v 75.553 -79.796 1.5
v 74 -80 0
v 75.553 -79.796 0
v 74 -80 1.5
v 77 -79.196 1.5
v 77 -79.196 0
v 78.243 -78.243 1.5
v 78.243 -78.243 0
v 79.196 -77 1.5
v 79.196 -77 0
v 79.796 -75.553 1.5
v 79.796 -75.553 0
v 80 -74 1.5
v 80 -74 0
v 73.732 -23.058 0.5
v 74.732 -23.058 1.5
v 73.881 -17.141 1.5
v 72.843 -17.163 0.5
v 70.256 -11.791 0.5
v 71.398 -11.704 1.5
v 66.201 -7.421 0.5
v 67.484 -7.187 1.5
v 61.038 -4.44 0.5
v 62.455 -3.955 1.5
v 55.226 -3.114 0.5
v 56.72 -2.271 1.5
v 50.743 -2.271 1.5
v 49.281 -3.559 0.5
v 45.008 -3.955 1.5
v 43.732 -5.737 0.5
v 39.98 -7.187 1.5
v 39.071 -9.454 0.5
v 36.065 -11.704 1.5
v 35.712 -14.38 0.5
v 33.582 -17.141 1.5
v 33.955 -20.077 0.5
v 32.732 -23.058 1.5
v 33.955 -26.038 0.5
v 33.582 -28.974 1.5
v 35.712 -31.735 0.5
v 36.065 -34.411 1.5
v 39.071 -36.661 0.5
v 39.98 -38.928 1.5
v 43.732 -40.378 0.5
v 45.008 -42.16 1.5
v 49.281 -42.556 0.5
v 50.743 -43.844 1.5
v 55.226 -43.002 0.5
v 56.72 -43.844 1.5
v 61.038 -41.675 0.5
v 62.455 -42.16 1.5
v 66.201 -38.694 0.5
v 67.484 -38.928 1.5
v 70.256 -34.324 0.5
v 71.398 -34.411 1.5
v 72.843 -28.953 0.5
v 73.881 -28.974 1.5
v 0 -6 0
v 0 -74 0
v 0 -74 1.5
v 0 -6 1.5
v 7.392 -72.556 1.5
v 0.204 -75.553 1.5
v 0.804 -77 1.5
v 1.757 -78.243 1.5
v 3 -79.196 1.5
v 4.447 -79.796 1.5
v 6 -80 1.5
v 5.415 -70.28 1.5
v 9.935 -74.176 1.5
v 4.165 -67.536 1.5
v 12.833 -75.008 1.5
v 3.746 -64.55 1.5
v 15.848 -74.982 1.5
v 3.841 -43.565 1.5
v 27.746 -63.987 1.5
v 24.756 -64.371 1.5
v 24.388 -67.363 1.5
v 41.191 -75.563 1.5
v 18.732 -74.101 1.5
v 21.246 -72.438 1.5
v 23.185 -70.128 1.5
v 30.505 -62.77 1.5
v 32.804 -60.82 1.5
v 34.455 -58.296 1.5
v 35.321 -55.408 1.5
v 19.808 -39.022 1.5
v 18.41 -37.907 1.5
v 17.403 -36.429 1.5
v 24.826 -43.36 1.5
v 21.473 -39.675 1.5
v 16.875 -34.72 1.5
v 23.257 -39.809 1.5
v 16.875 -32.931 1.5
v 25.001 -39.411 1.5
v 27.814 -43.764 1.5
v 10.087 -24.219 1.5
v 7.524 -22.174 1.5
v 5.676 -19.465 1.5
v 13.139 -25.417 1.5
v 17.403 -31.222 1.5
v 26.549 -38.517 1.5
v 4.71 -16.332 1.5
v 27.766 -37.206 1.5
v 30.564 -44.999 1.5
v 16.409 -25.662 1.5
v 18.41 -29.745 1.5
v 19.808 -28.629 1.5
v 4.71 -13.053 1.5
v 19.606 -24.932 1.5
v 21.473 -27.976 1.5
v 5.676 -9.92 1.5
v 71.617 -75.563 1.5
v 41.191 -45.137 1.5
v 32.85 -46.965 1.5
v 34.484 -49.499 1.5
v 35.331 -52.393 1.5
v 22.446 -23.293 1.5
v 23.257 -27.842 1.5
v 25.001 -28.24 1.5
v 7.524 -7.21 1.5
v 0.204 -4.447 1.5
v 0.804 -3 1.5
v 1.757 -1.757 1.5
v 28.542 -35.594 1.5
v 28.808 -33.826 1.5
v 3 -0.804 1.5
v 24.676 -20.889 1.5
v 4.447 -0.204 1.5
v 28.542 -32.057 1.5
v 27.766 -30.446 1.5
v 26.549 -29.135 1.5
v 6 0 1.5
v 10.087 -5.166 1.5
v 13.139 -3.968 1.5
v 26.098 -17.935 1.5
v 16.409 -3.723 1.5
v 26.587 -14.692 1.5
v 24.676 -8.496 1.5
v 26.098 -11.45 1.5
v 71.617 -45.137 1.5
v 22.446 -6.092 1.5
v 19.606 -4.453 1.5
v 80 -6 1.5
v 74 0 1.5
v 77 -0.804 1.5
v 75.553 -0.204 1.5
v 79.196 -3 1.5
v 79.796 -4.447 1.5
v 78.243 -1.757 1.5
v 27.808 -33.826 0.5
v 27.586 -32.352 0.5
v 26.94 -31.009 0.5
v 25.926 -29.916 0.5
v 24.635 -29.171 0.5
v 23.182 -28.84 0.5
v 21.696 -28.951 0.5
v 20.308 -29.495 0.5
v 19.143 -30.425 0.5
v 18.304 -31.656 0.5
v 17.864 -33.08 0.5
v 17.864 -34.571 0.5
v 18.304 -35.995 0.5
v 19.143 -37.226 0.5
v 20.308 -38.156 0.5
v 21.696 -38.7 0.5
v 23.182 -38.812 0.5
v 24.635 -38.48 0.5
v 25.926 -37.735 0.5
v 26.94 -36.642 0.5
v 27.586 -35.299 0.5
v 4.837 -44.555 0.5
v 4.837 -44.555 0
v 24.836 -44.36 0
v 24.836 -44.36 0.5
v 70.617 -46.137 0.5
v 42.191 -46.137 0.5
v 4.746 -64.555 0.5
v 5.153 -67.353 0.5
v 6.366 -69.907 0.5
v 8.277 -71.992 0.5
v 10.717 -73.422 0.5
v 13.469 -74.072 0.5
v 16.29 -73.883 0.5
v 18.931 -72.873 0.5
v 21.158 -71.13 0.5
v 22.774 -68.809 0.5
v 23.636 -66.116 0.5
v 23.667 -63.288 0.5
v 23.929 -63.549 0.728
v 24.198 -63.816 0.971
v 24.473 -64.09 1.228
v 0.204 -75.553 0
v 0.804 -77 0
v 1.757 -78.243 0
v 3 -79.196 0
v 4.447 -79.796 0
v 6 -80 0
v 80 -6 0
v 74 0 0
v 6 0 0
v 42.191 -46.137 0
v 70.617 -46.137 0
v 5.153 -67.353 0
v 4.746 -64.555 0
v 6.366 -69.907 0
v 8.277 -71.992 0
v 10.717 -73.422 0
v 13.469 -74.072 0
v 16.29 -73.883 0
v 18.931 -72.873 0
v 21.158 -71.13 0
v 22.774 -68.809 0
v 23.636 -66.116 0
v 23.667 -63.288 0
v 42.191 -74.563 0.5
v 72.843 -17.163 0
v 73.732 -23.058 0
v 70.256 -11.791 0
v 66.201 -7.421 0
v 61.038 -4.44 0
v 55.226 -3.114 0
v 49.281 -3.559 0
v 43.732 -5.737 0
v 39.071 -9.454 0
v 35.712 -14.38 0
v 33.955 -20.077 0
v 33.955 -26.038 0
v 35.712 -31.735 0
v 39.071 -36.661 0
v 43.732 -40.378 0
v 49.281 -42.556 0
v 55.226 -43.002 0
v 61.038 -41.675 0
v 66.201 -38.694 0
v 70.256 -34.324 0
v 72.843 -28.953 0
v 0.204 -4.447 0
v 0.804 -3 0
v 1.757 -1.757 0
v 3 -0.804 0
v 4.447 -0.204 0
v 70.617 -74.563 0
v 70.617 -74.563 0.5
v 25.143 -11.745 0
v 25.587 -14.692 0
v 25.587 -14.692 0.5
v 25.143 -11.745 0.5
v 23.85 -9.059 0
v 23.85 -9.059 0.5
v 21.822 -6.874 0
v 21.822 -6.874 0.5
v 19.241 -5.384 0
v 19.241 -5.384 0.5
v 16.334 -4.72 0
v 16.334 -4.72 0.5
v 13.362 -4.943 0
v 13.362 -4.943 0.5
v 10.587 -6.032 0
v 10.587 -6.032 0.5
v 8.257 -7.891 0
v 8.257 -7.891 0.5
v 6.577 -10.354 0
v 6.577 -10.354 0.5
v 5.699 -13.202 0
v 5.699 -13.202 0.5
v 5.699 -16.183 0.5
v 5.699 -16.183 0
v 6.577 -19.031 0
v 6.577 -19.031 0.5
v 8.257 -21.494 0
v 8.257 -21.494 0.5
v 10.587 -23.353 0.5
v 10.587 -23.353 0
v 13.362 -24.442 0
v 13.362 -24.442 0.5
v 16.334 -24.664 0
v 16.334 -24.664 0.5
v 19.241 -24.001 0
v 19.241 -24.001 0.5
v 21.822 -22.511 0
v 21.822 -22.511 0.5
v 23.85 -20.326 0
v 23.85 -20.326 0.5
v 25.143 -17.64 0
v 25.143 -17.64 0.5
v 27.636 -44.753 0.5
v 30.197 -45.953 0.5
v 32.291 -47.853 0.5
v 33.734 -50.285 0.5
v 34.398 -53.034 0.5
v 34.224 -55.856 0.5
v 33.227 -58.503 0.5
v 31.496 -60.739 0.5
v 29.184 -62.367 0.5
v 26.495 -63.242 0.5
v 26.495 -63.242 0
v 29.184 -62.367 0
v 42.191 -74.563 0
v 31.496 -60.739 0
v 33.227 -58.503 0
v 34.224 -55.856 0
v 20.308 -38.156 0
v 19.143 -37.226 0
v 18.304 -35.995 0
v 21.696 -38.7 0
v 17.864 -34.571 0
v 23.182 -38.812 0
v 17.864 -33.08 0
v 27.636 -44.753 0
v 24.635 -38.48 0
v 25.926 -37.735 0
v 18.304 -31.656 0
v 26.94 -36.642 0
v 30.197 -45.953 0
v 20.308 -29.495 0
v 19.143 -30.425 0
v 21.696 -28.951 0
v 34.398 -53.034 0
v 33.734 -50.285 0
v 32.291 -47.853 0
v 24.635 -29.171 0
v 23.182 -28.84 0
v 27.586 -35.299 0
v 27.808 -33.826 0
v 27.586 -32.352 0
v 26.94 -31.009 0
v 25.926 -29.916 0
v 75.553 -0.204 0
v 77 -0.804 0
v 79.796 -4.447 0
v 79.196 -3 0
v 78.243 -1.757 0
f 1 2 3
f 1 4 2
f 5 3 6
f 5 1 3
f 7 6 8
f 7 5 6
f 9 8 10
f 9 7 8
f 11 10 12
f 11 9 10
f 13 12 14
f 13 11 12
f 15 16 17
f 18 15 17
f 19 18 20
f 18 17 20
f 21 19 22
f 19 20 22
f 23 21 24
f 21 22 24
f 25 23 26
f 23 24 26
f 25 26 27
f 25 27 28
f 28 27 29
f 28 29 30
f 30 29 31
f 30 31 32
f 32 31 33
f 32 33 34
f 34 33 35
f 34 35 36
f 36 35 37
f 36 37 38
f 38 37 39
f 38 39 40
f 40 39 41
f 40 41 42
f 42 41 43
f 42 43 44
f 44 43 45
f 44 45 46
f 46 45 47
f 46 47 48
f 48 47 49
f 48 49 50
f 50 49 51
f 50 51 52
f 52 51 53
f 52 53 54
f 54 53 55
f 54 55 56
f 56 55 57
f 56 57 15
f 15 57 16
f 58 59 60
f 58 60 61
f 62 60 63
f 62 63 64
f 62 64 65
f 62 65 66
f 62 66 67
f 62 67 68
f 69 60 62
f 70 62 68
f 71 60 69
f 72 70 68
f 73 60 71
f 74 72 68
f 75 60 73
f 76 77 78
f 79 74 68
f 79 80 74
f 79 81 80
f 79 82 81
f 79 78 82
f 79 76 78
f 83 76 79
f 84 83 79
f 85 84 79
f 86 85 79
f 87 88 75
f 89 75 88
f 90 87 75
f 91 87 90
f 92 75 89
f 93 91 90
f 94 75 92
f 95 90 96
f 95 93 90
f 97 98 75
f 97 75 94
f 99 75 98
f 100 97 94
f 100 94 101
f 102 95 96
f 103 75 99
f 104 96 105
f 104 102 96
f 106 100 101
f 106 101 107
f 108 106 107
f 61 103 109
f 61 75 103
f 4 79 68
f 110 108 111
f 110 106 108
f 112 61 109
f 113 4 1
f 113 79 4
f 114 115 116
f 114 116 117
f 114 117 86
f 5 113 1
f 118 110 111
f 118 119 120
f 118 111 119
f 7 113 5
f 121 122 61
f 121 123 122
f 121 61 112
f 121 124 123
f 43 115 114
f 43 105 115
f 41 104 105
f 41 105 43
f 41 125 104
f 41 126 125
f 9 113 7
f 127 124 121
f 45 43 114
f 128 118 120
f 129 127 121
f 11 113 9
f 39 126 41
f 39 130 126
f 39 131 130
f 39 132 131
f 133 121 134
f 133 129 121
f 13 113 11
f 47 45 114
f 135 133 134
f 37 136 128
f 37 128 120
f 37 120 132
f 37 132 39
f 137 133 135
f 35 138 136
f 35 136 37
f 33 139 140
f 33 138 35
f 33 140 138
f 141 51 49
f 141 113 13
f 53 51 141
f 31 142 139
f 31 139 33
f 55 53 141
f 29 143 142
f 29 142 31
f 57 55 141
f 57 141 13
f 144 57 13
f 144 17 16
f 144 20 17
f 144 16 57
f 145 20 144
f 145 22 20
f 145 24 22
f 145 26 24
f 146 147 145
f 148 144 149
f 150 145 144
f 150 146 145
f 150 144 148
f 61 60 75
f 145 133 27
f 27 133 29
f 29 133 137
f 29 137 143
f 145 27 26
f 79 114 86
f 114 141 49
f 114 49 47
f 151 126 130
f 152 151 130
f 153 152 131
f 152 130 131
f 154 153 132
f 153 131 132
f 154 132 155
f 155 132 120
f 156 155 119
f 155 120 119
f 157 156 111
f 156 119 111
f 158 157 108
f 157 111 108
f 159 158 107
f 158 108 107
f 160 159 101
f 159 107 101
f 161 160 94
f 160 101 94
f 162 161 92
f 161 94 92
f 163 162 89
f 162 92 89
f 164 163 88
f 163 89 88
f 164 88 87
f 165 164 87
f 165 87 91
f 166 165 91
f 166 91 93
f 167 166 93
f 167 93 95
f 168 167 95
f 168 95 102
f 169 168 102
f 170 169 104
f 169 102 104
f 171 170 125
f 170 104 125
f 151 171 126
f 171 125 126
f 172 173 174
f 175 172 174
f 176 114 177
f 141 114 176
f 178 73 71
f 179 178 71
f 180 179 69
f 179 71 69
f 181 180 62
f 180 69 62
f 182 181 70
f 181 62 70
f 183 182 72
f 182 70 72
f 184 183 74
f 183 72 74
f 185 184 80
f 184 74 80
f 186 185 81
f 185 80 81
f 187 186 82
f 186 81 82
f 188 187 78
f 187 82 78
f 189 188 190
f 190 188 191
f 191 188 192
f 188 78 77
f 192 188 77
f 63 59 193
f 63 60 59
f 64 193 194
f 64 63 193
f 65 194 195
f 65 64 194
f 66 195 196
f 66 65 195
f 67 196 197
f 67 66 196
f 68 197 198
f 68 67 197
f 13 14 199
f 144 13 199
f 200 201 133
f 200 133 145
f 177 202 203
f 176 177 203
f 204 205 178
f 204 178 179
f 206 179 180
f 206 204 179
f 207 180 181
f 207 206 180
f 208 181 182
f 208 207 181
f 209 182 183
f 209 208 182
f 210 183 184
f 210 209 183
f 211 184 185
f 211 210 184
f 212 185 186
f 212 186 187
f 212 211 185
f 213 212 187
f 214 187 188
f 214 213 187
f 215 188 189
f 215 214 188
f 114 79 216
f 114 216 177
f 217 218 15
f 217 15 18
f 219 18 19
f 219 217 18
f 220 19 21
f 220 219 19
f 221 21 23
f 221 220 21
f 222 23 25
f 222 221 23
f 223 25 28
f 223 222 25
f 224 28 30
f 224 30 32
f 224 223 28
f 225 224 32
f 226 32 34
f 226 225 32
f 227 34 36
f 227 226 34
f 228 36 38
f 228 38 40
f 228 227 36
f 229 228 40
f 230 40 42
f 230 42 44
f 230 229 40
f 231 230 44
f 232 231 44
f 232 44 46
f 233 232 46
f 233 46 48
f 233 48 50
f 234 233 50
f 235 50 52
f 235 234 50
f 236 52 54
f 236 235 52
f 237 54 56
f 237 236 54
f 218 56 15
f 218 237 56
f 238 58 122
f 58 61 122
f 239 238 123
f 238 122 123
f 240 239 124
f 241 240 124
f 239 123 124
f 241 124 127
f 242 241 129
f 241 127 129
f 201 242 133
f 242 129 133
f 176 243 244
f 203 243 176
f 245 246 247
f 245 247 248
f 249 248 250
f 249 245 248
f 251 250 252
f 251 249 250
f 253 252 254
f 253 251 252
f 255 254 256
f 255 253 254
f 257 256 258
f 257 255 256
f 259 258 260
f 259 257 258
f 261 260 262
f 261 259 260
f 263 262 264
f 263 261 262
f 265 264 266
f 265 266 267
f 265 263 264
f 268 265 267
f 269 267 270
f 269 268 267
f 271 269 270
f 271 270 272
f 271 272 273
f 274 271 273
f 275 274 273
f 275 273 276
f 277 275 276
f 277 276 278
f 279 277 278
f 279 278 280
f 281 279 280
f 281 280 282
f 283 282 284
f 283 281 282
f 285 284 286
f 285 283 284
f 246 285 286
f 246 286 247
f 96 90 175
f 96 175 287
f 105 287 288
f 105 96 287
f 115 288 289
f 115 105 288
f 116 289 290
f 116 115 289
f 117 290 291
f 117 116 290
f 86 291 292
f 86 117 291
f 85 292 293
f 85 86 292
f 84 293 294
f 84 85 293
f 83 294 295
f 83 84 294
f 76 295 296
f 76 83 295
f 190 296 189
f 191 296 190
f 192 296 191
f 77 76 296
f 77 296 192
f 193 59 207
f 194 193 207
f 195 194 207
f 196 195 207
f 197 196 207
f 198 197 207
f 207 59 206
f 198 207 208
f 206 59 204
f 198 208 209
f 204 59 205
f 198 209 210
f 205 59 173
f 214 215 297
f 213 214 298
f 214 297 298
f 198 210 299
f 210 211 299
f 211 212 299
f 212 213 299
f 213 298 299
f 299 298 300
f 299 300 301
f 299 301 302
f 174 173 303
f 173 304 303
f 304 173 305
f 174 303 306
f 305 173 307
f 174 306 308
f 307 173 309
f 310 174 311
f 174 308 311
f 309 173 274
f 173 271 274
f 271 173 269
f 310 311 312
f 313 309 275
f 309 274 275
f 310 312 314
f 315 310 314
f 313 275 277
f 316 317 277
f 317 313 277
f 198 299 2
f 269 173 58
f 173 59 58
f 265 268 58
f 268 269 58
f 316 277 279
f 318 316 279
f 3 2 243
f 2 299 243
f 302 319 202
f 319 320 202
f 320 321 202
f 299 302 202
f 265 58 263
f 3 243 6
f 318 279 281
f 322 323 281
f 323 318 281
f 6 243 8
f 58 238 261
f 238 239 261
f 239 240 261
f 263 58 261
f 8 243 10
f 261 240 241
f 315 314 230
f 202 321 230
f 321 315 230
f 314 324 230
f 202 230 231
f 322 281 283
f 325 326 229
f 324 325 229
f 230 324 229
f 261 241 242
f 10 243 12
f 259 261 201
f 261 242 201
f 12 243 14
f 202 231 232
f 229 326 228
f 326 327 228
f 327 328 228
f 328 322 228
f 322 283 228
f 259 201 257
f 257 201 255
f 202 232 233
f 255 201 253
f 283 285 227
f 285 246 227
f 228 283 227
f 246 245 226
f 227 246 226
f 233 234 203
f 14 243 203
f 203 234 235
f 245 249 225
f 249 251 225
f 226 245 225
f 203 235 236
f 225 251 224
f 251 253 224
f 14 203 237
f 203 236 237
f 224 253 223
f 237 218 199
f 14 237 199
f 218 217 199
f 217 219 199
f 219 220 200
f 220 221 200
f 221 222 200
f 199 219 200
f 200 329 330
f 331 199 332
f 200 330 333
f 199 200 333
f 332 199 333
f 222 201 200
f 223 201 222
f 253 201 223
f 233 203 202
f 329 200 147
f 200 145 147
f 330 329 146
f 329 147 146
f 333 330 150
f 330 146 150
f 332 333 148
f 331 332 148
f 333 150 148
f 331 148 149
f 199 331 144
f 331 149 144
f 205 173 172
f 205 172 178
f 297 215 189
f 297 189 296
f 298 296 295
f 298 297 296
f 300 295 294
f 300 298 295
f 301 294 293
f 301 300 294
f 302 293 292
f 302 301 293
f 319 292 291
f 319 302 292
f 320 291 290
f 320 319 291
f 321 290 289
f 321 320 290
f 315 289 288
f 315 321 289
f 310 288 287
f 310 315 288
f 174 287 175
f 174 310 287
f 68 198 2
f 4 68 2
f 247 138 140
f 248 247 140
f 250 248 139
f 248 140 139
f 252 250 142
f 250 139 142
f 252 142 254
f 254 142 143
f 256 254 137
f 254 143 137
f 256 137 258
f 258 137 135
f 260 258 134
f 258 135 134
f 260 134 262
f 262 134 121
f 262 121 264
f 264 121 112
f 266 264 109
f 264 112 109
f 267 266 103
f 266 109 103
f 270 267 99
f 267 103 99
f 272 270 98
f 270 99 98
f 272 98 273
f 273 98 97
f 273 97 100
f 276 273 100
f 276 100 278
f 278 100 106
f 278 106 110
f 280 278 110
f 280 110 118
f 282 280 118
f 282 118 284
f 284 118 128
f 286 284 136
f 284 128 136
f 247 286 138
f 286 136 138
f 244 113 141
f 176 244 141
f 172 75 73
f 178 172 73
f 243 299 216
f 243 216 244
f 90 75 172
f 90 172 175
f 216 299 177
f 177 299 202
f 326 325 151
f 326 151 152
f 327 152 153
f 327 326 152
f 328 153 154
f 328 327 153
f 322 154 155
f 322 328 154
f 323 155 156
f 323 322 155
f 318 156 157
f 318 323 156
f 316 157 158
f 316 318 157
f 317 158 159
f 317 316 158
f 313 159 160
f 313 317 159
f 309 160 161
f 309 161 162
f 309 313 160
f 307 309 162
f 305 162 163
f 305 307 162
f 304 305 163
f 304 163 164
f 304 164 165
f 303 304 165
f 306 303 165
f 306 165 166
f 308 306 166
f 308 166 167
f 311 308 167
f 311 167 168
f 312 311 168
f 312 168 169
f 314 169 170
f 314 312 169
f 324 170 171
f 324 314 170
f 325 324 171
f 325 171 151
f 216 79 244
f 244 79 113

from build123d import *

# Parameters (mm, degrees)
SKETCH_W     = 80
SKETCH_H     = 80
SKETCH_R     = 5
SKETCH_R_2   = 10
SKETCH_R_3   = 20
SKETCH_W_2   = 28.426124
SKETCH_H_2   = 28.426124
PAD_DEPTH    = 1.5
CHAMFER_SIZE = 1
FILLET_R     = 6


with BuildPart() as part:
    # Sketch → Pad (new body)
    with BuildSketch(Plane.XY):
        with Locations((40, -40)):
            Rectangle(SKETCH_W, SKETCH_H)
        with Locations((22.808456, -33.825606)):
            Circle(SKETCH_R, mode=Mode.SUBTRACT)
        with Locations((15.587115, -14.692374)):
            Circle(SKETCH_R_2, mode=Mode.SUBTRACT)
        with Locations((53.731579, -23.05761)):
            Circle(SKETCH_R_3, mode=Mode.SUBTRACT)
        with BuildLine():
            Line((4.836625, -44.554906), (24.835676, -44.360099))
            ThreePointArc((23.667351, -63.288176), (34.416474, -54.451564), (24.835676, -44.360099))
            ThreePointArc((4.745591, -64.554699), (14.886633, -74.083006), (23.667351, -63.288176))
            Line((4.836625, -44.554906), (4.745591, -64.554699))
        make_face(mode=Mode.SUBTRACT)
        with Locations((56.404202, -60.349873)):
            Rectangle(SKETCH_W_2, SKETCH_H_2, mode=Mode.SUBTRACT)
    extrude(amount=PAD_DEPTH)

    # Chamfer
    chamfer_edges = [part.edges().sort_by_distance(p)[0] for p in [
        (42.19114, -60.349873, 1.5),
        (56.404202, -46.136811, 1.5),
        (70.617264, -60.349873, 1.5),
        (56.404202, -74.562935, 1.5),
        (4.791108, -54.554802, 1.5),
        (14.83615, -44.457503, 1.5),
        (14.886633, -74.083006, 1.5),
        (34.416474, -54.451564, 1.5),
        (33.731579, -23.05761, 1.5),
        (17.808456, -33.825606, 1.5),
        (5.587115, -14.692374, 1.5),
    ]]
    chamfer(chamfer_edges, length=CHAMFER_SIZE)

    # Fillet
    fillet_edges = [part.edges().sort_by_distance(p)[0] for p in [
        (80, 0, 0.75),
        (80, -80, 0.75),
        (0, -80, 0.75),
        (0, 0, 0.75),
    ]]
    fillet(fillet_edges, radius=FILLET_R)


solid = part.part
